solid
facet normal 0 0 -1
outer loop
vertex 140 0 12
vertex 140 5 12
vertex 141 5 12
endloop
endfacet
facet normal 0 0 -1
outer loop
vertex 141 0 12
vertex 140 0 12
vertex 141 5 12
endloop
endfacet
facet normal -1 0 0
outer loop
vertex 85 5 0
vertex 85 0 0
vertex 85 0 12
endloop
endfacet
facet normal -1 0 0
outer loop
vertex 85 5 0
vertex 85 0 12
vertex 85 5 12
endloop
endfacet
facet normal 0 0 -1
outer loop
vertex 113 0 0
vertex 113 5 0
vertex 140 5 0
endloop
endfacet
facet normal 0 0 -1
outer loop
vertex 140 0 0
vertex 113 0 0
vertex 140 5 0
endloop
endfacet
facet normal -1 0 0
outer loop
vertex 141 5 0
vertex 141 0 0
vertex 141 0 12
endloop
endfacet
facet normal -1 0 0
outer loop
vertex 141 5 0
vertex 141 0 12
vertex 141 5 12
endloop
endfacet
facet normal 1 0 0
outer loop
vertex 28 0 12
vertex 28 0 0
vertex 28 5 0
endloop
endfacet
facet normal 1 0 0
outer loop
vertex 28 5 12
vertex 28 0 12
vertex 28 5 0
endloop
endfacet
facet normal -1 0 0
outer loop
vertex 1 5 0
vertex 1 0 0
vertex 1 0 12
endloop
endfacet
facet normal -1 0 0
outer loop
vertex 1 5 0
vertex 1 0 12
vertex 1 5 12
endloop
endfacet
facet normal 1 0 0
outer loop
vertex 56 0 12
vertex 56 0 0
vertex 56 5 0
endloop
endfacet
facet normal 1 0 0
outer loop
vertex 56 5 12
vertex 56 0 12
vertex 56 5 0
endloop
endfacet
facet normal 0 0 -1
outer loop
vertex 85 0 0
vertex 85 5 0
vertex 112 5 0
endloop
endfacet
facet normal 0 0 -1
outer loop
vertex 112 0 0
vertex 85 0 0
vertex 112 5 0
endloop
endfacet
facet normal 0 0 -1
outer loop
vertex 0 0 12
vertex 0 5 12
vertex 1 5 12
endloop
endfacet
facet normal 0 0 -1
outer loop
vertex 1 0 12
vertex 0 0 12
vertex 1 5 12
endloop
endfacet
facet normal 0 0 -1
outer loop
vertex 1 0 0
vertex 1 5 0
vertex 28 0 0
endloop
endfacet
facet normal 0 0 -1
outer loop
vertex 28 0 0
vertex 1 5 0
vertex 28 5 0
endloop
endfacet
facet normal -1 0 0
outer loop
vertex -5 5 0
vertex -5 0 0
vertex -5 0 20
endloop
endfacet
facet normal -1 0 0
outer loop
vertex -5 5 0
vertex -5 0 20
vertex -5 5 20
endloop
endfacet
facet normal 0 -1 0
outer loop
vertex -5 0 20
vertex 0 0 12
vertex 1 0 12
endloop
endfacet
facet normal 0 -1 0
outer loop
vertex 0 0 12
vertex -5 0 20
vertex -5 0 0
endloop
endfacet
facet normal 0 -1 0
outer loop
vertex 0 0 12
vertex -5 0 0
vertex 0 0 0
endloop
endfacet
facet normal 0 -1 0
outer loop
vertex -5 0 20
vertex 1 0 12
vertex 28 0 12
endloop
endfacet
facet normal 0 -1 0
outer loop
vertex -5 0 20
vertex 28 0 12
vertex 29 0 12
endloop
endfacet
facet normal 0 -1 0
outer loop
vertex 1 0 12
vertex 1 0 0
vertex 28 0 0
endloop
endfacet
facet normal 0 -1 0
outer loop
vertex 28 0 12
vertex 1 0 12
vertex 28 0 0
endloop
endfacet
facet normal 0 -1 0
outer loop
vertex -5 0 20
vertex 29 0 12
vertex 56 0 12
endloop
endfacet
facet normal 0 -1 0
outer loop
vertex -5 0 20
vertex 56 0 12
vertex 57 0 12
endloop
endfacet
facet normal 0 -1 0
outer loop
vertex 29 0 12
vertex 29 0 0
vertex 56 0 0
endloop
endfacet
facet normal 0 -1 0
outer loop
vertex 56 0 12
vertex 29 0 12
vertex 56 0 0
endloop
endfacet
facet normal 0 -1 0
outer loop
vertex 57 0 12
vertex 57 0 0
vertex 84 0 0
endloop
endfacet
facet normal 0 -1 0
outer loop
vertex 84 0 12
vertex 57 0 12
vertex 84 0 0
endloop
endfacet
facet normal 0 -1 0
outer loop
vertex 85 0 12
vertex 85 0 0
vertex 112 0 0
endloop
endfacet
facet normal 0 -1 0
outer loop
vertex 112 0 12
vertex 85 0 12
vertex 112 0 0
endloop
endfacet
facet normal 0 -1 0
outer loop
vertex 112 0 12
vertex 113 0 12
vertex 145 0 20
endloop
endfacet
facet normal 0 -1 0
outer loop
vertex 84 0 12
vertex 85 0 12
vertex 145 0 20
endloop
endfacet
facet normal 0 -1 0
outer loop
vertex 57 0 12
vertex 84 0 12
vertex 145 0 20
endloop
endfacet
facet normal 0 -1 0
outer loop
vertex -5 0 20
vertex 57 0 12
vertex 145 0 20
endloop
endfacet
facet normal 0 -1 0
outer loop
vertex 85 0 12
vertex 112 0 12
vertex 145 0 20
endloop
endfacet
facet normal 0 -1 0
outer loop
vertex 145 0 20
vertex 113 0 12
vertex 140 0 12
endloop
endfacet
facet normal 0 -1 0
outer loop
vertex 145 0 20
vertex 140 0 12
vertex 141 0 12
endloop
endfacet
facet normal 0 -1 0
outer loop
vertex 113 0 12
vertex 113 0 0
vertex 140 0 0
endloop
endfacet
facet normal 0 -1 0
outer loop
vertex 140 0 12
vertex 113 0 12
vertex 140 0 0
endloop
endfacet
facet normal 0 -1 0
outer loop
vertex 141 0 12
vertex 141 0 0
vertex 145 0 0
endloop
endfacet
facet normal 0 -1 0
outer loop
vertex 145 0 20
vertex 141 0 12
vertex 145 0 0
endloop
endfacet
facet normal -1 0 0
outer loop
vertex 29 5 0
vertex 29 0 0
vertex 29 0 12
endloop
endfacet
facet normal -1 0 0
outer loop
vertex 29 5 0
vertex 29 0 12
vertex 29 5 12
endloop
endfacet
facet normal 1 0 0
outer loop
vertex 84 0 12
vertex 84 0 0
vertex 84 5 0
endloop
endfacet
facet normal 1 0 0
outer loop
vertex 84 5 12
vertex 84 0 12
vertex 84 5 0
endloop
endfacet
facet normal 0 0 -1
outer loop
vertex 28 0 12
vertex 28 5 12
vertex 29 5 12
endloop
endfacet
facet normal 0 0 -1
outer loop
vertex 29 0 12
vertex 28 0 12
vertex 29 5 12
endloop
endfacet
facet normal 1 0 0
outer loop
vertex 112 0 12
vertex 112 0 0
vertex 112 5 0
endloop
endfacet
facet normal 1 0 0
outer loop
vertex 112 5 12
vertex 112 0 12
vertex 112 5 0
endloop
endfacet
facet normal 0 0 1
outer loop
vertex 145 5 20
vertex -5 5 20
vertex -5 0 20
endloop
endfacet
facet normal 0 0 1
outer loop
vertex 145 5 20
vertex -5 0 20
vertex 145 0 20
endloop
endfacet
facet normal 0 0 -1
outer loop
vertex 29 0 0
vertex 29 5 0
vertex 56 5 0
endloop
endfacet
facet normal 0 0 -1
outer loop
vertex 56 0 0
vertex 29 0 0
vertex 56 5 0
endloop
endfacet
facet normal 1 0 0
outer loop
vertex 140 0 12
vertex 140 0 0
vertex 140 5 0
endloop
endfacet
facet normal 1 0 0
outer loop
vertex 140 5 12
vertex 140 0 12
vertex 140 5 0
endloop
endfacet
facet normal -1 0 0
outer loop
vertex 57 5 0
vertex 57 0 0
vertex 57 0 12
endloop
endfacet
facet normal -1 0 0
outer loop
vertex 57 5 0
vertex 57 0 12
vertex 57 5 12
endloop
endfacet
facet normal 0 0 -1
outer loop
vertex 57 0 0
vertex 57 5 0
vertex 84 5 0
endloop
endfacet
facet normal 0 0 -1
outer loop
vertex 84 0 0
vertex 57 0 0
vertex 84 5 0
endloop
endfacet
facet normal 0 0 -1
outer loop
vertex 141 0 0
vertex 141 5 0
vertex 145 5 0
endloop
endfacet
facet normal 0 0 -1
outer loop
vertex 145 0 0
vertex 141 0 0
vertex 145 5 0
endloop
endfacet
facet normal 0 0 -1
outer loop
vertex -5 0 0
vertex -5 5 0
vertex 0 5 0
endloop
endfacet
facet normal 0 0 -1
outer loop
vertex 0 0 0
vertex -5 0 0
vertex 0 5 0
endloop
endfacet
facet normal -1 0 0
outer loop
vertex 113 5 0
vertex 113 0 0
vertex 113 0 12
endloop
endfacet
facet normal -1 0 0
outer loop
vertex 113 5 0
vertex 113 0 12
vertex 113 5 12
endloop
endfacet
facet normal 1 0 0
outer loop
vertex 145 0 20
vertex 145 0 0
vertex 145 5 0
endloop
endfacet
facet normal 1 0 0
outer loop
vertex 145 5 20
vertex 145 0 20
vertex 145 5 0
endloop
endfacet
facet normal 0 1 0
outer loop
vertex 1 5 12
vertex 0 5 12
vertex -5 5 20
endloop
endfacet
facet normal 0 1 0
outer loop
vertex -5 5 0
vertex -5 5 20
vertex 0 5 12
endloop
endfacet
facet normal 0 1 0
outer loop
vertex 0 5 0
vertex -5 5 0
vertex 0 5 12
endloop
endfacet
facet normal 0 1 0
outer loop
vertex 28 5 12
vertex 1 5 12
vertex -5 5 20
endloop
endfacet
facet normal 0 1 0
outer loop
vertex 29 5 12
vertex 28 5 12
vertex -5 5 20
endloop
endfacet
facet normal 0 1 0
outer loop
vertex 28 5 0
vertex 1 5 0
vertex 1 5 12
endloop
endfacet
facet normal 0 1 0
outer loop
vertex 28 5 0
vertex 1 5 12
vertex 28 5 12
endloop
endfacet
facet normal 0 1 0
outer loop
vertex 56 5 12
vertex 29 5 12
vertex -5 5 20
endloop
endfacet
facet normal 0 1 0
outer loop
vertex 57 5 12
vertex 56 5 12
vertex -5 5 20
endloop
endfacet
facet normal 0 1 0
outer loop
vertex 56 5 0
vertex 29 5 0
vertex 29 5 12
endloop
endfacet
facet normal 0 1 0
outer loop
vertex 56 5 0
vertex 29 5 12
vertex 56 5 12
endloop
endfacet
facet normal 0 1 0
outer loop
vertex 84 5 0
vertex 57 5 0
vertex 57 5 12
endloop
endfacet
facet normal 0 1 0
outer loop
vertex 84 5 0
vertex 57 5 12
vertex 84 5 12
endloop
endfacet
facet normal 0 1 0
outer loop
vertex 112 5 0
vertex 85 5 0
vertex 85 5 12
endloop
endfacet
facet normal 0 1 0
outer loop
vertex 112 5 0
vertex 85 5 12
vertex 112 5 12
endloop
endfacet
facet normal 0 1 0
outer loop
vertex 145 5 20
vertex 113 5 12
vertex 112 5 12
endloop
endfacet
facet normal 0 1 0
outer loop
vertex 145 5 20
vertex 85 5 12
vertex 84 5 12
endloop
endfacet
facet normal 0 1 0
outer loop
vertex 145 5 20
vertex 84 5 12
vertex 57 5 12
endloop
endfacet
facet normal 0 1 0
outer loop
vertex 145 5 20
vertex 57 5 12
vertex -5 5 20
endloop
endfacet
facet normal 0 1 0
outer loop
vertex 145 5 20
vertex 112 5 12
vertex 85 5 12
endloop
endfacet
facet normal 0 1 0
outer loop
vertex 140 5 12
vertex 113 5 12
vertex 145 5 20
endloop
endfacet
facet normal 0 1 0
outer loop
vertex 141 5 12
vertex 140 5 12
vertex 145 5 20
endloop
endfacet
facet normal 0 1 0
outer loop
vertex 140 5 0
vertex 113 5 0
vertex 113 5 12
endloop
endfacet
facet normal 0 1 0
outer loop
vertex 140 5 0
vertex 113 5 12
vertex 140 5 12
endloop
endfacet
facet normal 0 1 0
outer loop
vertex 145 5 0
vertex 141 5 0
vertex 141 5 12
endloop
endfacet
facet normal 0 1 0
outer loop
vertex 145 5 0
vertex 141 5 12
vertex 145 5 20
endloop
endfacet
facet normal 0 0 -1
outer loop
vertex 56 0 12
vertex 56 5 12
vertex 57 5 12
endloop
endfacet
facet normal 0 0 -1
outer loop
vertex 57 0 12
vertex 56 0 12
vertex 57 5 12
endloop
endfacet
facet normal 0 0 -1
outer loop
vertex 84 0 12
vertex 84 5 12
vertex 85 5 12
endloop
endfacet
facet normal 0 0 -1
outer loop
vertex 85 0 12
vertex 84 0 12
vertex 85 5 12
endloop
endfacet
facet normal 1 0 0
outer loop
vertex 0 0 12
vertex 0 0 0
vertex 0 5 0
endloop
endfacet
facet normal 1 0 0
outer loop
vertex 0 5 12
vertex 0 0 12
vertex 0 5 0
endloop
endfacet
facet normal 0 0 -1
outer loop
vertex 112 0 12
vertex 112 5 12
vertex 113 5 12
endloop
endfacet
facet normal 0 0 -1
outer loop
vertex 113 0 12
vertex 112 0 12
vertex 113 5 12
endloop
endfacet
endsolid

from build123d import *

# Parameters (mm, degrees)
BOX001_W      = 1
BOX001_H      = 5
BOX001_DEPTH  = 12
ARRAY_X_COUNT = 6
ARRAY_X_PITCH = 28
BOX_W         = 150
BOX_H         = 5
BOX_DEPTH     = 20


with BuildPart() as array:
    # Box001 → Box001 (new body)
    with BuildSketch(Plane.XY):
        with Locations((0.5, 2.5)):
            Rectangle(BOX001_W, BOX001_H)
    extrude(amount=BOX001_DEPTH)

    # Array X: Array ×6


with BuildPart() as array_1:
    add(array.part)
    with Locations(*[(i * ARRAY_X_PITCH, 0, 0) for i in range(1, ARRAY_X_COUNT)]):
        add(array.part)


with BuildPart() as cut:
    # Box → Box (new body)
    with BuildSketch(Plane(origin=(-5, 0, 0), x_dir=(1, 0, 0), z_dir=(0, 0, 1))):
        with Locations((75, 2.5)):
            Rectangle(BOX_W, BOX_H)
    extrude(amount=BOX_DEPTH)

    # Cut: cut Array
    add(array_1.part, mode=Mode.SUBTRACT)


solid = cut.part
